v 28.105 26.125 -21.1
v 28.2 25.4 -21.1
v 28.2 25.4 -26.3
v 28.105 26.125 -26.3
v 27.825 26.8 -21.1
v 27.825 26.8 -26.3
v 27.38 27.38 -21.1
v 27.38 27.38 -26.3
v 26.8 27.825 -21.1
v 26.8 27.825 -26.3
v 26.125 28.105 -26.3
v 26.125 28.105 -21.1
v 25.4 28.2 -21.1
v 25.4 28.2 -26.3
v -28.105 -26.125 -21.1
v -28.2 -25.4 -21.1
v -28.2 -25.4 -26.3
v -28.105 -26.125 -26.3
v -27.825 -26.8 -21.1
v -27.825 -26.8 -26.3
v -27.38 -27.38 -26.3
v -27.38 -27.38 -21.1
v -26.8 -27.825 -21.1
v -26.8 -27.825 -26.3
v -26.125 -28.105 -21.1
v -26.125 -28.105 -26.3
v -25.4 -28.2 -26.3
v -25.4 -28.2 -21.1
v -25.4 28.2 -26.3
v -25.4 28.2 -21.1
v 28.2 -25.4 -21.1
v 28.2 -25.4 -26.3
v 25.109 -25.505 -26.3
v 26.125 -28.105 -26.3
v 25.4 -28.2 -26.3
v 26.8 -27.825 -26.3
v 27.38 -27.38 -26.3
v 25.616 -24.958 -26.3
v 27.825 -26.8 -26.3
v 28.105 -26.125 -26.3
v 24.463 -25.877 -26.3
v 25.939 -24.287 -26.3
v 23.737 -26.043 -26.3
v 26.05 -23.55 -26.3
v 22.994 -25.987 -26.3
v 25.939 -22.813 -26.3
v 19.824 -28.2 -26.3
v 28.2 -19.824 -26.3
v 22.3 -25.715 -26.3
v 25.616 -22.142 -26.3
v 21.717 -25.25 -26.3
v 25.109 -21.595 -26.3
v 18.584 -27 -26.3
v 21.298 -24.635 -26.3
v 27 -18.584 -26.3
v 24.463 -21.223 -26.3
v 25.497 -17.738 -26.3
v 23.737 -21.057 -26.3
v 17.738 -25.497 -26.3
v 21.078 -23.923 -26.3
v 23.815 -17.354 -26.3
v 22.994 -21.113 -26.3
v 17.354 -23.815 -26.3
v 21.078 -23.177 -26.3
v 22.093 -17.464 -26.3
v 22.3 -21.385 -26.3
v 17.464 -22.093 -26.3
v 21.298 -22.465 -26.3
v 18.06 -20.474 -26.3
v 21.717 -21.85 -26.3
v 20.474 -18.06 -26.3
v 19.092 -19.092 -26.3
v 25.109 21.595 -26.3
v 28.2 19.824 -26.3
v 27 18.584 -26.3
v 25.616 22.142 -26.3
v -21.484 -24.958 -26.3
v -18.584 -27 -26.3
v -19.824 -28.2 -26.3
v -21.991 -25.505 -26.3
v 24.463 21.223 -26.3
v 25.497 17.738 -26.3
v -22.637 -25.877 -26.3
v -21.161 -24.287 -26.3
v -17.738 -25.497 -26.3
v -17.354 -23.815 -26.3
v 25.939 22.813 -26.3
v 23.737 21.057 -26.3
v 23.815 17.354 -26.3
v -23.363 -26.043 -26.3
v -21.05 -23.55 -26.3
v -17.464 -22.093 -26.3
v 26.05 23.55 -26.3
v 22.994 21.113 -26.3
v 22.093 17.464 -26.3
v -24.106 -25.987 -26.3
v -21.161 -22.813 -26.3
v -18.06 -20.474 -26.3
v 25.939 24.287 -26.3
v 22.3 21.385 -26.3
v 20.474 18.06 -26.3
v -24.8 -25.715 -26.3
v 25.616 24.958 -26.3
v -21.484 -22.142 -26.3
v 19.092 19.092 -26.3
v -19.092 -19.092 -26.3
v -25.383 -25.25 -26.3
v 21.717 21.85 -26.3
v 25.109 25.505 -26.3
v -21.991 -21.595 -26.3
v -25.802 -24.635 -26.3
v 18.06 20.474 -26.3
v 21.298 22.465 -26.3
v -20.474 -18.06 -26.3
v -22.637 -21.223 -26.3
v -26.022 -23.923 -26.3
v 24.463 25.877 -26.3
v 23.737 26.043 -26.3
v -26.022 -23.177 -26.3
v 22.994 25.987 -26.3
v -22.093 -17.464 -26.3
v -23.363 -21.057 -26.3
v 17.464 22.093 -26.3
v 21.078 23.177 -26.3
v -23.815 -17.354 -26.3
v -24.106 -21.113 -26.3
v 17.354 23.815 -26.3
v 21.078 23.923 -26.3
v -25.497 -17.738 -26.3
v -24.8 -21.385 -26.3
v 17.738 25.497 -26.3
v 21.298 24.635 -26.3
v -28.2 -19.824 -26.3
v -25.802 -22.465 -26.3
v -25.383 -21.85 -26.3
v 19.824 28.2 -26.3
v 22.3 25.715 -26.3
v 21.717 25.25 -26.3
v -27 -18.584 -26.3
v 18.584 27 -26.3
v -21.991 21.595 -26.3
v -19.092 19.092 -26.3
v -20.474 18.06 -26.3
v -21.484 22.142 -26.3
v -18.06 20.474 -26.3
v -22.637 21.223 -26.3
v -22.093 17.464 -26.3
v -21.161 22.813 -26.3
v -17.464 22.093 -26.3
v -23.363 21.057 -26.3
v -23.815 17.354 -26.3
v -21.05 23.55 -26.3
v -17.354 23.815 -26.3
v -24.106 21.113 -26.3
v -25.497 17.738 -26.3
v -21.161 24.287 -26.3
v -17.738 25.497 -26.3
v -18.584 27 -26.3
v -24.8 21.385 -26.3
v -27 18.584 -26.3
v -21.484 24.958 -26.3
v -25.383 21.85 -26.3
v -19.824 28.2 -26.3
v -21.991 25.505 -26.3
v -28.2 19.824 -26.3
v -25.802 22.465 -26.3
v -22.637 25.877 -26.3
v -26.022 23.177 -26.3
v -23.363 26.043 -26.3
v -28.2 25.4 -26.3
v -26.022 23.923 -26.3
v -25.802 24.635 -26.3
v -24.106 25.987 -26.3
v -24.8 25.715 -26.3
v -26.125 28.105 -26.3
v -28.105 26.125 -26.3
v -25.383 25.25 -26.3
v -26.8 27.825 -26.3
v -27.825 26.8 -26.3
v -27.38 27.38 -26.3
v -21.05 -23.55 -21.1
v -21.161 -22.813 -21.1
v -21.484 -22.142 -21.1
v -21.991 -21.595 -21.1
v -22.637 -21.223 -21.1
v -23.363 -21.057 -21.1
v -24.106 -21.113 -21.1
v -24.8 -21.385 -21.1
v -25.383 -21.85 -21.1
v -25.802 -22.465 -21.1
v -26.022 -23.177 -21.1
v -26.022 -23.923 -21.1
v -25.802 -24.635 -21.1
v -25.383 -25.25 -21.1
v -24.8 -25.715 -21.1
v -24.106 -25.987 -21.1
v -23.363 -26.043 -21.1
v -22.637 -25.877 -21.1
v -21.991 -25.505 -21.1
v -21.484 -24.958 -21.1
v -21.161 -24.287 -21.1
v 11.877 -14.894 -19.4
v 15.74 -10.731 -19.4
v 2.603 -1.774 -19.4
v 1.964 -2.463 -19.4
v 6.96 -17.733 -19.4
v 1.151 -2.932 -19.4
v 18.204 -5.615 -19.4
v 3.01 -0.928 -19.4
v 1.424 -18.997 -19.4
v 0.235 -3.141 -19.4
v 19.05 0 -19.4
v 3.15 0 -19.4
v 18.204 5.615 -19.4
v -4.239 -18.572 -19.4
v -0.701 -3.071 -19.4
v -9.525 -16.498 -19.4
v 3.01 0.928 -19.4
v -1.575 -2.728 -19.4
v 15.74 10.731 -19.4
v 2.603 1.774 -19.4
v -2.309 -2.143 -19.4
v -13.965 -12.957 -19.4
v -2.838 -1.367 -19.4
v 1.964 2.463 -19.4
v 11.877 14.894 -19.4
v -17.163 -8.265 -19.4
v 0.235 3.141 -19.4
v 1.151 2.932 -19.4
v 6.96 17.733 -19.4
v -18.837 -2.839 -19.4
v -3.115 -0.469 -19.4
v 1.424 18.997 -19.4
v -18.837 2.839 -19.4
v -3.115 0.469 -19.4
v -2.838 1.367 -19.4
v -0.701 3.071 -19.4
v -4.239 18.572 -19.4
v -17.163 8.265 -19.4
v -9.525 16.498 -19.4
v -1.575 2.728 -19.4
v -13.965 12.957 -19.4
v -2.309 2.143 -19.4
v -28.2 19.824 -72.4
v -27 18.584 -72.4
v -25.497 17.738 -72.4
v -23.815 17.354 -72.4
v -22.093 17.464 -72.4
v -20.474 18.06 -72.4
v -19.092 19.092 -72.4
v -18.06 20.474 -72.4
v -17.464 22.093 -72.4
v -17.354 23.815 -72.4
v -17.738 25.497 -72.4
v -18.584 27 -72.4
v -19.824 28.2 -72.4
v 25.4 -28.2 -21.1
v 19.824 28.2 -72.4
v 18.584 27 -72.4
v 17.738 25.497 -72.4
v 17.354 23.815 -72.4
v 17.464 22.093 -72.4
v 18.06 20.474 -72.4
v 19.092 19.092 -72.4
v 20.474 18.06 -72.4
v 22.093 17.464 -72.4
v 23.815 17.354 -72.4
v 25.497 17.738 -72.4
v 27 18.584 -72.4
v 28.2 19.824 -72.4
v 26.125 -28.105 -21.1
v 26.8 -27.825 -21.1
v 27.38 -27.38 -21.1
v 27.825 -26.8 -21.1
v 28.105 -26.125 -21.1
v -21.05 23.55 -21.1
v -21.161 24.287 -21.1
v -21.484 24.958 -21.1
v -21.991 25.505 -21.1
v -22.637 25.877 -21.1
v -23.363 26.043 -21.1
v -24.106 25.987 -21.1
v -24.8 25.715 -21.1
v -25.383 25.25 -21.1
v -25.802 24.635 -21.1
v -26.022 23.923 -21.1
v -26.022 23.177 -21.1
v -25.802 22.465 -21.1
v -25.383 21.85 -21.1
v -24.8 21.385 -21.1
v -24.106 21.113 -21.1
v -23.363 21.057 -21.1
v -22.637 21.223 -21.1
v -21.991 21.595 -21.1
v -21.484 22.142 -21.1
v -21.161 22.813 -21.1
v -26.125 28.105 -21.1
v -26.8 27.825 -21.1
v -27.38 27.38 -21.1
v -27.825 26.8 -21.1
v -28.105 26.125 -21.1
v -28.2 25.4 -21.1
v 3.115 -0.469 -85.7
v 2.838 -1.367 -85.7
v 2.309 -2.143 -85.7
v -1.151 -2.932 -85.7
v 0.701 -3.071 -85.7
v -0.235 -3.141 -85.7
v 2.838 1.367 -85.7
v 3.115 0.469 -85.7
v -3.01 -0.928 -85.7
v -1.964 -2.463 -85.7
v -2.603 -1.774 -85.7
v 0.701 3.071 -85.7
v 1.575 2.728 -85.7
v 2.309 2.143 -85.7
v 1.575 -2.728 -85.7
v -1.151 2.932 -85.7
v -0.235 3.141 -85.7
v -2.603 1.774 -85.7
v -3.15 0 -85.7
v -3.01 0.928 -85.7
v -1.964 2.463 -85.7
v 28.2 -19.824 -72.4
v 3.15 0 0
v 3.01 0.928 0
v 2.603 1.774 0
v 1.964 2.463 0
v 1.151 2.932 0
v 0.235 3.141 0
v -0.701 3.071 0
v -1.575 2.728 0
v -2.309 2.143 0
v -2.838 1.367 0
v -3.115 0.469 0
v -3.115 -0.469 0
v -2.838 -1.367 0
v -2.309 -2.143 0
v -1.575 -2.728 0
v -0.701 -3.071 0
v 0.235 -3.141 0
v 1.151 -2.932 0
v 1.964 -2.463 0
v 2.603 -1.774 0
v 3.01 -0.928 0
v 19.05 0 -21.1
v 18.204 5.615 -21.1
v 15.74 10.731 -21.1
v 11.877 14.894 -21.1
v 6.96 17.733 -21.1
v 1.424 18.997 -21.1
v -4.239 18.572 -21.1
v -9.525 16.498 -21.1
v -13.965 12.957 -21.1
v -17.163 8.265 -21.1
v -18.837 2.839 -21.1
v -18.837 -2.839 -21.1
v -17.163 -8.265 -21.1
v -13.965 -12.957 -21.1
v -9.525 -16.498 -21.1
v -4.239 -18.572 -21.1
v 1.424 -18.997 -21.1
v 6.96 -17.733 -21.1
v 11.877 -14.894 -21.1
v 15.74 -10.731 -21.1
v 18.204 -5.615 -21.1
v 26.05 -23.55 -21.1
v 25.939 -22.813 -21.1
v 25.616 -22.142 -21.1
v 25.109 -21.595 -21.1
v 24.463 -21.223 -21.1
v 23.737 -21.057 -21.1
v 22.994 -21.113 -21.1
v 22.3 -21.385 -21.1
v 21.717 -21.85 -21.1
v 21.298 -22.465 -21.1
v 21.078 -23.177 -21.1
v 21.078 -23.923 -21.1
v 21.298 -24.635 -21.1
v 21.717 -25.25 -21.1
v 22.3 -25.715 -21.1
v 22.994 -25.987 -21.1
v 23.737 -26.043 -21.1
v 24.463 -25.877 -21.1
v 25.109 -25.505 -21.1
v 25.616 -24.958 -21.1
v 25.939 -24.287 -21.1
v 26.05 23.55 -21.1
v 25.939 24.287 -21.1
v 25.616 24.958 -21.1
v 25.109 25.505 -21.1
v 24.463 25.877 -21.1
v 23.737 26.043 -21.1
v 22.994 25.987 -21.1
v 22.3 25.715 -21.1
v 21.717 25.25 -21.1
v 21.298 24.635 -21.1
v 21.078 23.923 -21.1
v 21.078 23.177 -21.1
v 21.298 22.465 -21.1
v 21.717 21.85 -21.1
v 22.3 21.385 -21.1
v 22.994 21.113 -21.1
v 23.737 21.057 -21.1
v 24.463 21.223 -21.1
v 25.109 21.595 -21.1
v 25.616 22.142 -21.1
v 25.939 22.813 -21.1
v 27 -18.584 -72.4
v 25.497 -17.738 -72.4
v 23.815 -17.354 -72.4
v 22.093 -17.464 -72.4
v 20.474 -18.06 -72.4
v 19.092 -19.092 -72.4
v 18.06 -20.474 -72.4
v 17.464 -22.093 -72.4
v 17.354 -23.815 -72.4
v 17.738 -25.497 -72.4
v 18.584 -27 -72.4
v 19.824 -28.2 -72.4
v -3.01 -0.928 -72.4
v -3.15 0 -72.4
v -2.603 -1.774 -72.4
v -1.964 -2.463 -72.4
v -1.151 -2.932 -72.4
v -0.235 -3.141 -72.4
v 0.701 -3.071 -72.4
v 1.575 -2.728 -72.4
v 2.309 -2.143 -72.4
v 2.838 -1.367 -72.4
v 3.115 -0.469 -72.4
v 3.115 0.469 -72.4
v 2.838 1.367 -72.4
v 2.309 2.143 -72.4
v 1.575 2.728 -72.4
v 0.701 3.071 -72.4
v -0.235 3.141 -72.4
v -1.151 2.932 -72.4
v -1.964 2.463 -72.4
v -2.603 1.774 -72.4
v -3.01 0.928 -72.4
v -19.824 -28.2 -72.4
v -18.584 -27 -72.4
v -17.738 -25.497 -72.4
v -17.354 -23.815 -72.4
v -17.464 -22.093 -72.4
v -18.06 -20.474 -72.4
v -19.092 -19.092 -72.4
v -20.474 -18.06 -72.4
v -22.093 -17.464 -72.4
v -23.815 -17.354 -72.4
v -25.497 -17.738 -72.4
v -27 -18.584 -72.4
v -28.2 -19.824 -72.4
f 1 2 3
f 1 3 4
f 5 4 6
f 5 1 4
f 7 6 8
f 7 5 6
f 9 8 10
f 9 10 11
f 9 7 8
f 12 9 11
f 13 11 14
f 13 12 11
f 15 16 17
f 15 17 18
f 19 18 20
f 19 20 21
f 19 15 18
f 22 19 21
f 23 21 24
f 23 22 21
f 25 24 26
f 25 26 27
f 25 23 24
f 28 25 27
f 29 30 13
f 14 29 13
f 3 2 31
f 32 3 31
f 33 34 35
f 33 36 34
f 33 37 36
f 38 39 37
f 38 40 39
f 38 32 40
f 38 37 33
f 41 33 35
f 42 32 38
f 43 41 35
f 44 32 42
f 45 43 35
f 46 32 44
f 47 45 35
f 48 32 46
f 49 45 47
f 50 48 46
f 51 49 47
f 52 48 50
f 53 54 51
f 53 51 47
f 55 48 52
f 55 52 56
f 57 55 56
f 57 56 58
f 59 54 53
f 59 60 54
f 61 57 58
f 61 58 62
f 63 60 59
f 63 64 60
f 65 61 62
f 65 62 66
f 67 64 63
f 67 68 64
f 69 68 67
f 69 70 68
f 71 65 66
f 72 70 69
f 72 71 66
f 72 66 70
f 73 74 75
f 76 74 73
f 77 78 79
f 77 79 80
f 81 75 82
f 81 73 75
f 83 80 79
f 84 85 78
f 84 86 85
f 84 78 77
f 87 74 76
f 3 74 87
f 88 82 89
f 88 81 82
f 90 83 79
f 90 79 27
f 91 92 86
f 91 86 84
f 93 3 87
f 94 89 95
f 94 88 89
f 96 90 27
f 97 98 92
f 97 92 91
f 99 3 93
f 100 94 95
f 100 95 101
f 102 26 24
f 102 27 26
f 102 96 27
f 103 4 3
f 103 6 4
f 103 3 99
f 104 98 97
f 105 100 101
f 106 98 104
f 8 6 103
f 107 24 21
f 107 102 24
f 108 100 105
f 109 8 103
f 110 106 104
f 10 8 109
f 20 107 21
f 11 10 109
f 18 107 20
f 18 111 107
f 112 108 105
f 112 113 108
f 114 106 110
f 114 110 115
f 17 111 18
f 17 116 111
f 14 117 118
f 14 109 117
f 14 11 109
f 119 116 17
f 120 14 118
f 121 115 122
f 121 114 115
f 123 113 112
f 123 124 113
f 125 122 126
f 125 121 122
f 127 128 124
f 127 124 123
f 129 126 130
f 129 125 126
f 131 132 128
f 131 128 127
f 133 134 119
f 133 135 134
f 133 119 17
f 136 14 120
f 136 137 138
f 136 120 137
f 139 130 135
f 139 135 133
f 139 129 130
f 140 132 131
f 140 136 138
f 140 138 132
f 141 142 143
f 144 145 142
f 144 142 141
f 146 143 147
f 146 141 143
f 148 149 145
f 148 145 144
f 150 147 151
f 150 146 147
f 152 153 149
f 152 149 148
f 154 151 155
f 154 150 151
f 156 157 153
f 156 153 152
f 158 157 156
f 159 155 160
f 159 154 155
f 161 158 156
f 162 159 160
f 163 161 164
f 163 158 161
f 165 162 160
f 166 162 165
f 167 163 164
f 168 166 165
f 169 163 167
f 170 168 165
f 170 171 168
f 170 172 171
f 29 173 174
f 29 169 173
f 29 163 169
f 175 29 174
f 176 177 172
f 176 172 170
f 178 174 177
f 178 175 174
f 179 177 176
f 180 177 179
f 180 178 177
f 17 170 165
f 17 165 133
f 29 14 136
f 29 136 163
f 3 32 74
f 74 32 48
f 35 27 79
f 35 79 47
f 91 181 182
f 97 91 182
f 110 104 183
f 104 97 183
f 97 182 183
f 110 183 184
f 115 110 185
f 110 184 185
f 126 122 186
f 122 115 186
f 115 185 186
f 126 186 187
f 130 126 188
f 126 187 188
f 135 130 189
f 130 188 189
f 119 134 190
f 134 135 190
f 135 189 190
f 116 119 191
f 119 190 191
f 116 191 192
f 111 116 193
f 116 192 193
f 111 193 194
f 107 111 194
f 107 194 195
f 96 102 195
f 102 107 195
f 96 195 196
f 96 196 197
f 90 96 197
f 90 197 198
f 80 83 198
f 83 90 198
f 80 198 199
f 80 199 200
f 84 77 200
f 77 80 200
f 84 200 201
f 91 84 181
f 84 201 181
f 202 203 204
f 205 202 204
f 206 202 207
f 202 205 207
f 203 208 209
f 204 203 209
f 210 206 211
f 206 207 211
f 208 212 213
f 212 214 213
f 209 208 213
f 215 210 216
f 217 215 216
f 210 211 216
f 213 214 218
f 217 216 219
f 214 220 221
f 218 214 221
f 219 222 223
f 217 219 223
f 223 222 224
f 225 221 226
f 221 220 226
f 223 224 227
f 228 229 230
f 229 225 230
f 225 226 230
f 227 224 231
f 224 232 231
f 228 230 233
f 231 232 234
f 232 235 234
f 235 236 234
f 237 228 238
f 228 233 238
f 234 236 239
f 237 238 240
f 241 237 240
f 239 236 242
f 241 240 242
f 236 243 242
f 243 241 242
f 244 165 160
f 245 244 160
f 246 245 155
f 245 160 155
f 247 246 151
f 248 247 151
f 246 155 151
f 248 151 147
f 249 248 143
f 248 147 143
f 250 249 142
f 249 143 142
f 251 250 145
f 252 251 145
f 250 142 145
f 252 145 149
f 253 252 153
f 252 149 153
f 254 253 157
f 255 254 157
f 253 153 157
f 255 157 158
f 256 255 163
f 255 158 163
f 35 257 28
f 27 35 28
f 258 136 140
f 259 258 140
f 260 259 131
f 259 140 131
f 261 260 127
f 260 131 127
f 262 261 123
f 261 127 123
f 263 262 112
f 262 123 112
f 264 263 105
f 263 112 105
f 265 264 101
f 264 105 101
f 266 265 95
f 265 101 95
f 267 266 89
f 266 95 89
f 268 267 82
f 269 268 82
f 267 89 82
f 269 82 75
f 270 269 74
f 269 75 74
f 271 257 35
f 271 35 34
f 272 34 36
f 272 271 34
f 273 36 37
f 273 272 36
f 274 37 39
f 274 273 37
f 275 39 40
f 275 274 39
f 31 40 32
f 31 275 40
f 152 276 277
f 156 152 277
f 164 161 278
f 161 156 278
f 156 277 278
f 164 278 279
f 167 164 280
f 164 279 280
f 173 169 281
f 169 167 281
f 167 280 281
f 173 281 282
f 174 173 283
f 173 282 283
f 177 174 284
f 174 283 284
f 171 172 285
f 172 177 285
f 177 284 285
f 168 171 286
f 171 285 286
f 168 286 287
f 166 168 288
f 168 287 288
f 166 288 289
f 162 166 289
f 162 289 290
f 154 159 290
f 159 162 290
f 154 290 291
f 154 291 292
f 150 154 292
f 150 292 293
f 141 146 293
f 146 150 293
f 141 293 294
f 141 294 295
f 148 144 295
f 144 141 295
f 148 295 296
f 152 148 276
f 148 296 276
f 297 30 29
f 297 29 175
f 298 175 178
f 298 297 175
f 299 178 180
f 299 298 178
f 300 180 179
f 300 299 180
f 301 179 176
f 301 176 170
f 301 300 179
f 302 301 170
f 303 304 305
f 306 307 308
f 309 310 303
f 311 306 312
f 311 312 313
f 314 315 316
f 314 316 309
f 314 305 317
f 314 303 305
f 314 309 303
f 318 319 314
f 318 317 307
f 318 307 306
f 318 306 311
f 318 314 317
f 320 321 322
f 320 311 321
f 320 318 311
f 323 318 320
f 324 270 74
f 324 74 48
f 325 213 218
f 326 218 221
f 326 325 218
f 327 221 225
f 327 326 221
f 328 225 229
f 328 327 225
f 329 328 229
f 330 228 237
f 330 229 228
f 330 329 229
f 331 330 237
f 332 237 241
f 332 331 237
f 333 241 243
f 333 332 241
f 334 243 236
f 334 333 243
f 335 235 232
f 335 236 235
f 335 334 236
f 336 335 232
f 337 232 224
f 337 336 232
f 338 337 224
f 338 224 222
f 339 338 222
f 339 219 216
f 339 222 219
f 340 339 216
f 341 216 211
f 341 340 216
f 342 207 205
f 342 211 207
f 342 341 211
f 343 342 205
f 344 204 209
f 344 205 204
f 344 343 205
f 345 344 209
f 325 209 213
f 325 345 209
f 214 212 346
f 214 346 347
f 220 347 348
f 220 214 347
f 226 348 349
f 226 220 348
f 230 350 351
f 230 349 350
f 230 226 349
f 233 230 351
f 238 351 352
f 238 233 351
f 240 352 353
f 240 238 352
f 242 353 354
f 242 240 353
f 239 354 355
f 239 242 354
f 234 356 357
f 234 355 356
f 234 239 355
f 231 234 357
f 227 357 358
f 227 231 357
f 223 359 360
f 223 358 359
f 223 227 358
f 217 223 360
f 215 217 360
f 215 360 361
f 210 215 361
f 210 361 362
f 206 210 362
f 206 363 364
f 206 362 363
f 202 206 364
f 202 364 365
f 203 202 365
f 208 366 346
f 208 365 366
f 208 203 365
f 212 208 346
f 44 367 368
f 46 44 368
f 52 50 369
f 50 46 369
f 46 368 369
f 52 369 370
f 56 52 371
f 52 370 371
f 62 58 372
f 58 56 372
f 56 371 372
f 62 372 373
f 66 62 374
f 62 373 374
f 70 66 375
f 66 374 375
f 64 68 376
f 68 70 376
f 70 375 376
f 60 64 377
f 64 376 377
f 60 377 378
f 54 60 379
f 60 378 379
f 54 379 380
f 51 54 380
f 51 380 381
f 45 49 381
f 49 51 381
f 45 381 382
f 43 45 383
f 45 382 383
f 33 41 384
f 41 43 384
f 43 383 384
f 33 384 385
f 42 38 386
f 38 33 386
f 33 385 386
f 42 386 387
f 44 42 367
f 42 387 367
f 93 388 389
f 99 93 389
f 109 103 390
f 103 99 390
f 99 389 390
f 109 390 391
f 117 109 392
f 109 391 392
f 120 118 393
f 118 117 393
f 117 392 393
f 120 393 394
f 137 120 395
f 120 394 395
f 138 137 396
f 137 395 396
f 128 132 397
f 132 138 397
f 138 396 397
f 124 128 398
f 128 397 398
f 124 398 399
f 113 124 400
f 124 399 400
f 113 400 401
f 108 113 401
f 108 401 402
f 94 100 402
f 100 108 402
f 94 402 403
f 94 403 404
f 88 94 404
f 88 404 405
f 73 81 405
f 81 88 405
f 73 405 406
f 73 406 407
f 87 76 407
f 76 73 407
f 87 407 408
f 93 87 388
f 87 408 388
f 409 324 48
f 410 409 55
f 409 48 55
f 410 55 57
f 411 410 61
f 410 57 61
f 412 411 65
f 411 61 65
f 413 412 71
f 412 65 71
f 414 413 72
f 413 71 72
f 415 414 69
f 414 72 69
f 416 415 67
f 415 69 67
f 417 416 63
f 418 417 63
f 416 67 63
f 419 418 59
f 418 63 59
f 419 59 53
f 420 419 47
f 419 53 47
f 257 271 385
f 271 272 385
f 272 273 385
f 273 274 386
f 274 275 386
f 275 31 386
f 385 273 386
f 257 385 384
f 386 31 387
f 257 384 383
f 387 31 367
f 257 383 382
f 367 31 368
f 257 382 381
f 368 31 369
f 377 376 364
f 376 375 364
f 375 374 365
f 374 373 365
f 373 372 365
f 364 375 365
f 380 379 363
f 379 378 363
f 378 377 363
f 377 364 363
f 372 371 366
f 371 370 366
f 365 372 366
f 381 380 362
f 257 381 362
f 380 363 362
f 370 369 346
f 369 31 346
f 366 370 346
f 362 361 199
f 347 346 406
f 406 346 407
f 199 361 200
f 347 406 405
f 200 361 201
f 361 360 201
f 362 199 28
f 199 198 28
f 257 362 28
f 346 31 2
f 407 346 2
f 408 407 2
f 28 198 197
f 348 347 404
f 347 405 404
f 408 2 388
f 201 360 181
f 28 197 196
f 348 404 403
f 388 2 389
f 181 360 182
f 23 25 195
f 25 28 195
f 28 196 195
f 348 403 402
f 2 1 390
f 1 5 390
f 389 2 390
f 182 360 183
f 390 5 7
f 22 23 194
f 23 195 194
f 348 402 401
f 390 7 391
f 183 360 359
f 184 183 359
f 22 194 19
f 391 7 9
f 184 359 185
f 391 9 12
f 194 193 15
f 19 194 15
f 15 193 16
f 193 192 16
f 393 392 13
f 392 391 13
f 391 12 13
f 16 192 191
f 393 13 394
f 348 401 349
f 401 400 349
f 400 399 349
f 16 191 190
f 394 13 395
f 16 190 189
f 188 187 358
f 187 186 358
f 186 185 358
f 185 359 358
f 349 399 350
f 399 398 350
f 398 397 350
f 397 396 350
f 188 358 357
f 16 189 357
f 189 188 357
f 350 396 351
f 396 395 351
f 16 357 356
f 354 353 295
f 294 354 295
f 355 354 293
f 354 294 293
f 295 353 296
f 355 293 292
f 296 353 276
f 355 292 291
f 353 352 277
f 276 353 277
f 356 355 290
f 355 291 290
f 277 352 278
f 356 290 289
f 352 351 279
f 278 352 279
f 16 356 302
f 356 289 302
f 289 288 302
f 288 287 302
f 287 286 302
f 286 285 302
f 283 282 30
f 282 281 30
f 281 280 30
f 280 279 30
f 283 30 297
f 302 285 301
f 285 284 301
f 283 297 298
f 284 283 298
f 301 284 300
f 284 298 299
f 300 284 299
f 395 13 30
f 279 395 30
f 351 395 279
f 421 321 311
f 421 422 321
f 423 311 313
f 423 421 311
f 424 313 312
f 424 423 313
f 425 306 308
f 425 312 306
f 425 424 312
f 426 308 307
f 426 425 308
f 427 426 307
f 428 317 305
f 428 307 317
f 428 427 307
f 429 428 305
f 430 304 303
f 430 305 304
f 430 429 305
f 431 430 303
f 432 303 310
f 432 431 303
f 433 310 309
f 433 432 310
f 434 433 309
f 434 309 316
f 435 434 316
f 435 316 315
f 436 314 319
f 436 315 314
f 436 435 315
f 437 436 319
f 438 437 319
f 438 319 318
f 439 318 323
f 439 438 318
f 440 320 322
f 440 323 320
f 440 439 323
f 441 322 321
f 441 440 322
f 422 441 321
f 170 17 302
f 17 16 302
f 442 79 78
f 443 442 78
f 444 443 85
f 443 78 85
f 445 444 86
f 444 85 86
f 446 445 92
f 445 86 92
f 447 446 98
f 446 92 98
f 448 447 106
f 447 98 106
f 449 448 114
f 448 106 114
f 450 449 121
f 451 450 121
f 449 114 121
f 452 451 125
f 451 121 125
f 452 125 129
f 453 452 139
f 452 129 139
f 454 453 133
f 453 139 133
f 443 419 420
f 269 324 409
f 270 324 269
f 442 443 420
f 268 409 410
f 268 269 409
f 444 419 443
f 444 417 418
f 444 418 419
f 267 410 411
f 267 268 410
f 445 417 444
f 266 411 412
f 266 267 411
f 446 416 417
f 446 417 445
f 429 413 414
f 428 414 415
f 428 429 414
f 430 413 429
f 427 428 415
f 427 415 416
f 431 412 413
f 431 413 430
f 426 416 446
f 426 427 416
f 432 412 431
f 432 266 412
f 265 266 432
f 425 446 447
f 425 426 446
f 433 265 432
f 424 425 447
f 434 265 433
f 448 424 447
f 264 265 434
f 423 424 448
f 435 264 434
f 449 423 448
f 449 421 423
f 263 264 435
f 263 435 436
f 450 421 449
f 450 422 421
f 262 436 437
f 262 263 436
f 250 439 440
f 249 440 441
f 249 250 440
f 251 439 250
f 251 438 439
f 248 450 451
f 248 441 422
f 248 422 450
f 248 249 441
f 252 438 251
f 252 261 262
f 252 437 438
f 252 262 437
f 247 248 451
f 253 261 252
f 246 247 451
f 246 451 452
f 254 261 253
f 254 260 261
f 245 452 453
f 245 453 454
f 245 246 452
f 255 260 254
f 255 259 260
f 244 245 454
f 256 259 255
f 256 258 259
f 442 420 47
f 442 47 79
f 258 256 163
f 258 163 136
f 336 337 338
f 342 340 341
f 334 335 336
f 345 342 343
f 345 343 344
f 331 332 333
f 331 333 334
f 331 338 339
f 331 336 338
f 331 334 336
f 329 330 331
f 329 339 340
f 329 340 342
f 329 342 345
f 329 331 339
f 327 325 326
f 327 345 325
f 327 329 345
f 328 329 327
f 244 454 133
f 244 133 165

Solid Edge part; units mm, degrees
sketch "Sketch1" plane through (0, 0, 0) normal (0, 0, 1) x (1, 0, 0)
  circle A0 centre (0, 0) radius 3.15
extrude "Protrusion1" add sketch "Sketch1" against normal blind 9
sketch "Sketch2" plane through (0, 0, -9) normal (0, 0, -1) x (1, 0, 0)
  circle A0 centre (0, 0) radius 3.15
extrude "ExtrudedProtrusion_2" add sketch "Sketch2" along normal blind 10.4
sketch "Sketch3" plane through (0, 0, -19.4) normal (0, 0, -1) x (1, 0, 0)
  circle A0 centre (0, 0) radius 19.05
  dimension "D1" = 38.1
extrude "ExtrudedProtrusion_3" add sketch "Sketch3" along normal blind 1.7
sketch "Sketch4" plane through (0, 0, -21.1) normal (0, 0, -1) x (1, 0, 0)
  circle A0 centre (23.55, 23.55) radius 2.5
  circle A1 centre (23.55, -23.55) radius 2.5
  circle A2 centre (-23.55, -23.55) radius 2.5
  circle A3 centre (-23.55, 23.55) radius 2.5
  line L0 (-25.4, -28.2) -> (25.4, -28.2)
  arc A4 (28.2, -25.4) -> (25.4, -28.2) centre (25.4, -25.4) cw
  line L1 (28.2, -25.4) -> (28.2, 25.4)
  arc A5 (25.4, 28.2) -> (28.2, 25.4) centre (25.4, 25.4) cw
  line L2 (25.4, 28.2) -> (-25.4, 28.2)
  arc A6 (-28.2, 25.4) -> (-25.4, 28.2) centre (-25.4, 25.4) cw
  line L3 (-28.2, 25.4) -> (-28.2, -25.4)
  arc A7 (-25.4, -28.2) -> (-28.2, -25.4) centre (-25.4, -25.4) cw
  dimension "D1" = 47.1
  dimension "D2" = 47.1
  dimension "D3" = 56.4
extrude "ExtrudedProtrusion_4" add sketch "Sketch4" along normal blind 5.2
sketch "Sketch5" plane through (0, 0, -26.3) normal (0, 0, -1) x (0, -1, 0)
  line L0 (-28.2, 19.8235) -> (-28.2, -19.8235)
  line L1 (-19.8235, -28.2) -> (19.8235, -28.2)
  line L2 (28.2, -19.8235) -> (28.2, 19.8235)
  line L3 (19.8235, 28.2) -> (-19.8235, 28.2)
  arc A0 (-28.2, -19.8235) -> (-19.8235, -28.2) centre (-23.3345, -23.3345) cw
  arc A1 (19.8235, -28.2) -> (28.2, -19.8235) centre (23.3345, -23.3345) cw
  arc A2 (28.2, 19.8235) -> (19.8235, 28.2) centre (23.3345, 23.3345) cw
  arc A3 (-19.8235, 28.2) -> (-28.2, 19.8235) centre (-23.3345, 23.3345) cw
extrude "ExtrudedProtrusion_5" add sketch "Sketch5" along normal blind 46.1
sketch "Sketch6" plane through (0, 0, -72.4) normal (0, 0, -1) x (-1, 0, 0)
  circle A0 centre (0, 0) radius 3.15
extrude "ExtrudedProtrusion_6" add sketch "Sketch6" along normal blind 13.3
properties material "Stainless steel"
